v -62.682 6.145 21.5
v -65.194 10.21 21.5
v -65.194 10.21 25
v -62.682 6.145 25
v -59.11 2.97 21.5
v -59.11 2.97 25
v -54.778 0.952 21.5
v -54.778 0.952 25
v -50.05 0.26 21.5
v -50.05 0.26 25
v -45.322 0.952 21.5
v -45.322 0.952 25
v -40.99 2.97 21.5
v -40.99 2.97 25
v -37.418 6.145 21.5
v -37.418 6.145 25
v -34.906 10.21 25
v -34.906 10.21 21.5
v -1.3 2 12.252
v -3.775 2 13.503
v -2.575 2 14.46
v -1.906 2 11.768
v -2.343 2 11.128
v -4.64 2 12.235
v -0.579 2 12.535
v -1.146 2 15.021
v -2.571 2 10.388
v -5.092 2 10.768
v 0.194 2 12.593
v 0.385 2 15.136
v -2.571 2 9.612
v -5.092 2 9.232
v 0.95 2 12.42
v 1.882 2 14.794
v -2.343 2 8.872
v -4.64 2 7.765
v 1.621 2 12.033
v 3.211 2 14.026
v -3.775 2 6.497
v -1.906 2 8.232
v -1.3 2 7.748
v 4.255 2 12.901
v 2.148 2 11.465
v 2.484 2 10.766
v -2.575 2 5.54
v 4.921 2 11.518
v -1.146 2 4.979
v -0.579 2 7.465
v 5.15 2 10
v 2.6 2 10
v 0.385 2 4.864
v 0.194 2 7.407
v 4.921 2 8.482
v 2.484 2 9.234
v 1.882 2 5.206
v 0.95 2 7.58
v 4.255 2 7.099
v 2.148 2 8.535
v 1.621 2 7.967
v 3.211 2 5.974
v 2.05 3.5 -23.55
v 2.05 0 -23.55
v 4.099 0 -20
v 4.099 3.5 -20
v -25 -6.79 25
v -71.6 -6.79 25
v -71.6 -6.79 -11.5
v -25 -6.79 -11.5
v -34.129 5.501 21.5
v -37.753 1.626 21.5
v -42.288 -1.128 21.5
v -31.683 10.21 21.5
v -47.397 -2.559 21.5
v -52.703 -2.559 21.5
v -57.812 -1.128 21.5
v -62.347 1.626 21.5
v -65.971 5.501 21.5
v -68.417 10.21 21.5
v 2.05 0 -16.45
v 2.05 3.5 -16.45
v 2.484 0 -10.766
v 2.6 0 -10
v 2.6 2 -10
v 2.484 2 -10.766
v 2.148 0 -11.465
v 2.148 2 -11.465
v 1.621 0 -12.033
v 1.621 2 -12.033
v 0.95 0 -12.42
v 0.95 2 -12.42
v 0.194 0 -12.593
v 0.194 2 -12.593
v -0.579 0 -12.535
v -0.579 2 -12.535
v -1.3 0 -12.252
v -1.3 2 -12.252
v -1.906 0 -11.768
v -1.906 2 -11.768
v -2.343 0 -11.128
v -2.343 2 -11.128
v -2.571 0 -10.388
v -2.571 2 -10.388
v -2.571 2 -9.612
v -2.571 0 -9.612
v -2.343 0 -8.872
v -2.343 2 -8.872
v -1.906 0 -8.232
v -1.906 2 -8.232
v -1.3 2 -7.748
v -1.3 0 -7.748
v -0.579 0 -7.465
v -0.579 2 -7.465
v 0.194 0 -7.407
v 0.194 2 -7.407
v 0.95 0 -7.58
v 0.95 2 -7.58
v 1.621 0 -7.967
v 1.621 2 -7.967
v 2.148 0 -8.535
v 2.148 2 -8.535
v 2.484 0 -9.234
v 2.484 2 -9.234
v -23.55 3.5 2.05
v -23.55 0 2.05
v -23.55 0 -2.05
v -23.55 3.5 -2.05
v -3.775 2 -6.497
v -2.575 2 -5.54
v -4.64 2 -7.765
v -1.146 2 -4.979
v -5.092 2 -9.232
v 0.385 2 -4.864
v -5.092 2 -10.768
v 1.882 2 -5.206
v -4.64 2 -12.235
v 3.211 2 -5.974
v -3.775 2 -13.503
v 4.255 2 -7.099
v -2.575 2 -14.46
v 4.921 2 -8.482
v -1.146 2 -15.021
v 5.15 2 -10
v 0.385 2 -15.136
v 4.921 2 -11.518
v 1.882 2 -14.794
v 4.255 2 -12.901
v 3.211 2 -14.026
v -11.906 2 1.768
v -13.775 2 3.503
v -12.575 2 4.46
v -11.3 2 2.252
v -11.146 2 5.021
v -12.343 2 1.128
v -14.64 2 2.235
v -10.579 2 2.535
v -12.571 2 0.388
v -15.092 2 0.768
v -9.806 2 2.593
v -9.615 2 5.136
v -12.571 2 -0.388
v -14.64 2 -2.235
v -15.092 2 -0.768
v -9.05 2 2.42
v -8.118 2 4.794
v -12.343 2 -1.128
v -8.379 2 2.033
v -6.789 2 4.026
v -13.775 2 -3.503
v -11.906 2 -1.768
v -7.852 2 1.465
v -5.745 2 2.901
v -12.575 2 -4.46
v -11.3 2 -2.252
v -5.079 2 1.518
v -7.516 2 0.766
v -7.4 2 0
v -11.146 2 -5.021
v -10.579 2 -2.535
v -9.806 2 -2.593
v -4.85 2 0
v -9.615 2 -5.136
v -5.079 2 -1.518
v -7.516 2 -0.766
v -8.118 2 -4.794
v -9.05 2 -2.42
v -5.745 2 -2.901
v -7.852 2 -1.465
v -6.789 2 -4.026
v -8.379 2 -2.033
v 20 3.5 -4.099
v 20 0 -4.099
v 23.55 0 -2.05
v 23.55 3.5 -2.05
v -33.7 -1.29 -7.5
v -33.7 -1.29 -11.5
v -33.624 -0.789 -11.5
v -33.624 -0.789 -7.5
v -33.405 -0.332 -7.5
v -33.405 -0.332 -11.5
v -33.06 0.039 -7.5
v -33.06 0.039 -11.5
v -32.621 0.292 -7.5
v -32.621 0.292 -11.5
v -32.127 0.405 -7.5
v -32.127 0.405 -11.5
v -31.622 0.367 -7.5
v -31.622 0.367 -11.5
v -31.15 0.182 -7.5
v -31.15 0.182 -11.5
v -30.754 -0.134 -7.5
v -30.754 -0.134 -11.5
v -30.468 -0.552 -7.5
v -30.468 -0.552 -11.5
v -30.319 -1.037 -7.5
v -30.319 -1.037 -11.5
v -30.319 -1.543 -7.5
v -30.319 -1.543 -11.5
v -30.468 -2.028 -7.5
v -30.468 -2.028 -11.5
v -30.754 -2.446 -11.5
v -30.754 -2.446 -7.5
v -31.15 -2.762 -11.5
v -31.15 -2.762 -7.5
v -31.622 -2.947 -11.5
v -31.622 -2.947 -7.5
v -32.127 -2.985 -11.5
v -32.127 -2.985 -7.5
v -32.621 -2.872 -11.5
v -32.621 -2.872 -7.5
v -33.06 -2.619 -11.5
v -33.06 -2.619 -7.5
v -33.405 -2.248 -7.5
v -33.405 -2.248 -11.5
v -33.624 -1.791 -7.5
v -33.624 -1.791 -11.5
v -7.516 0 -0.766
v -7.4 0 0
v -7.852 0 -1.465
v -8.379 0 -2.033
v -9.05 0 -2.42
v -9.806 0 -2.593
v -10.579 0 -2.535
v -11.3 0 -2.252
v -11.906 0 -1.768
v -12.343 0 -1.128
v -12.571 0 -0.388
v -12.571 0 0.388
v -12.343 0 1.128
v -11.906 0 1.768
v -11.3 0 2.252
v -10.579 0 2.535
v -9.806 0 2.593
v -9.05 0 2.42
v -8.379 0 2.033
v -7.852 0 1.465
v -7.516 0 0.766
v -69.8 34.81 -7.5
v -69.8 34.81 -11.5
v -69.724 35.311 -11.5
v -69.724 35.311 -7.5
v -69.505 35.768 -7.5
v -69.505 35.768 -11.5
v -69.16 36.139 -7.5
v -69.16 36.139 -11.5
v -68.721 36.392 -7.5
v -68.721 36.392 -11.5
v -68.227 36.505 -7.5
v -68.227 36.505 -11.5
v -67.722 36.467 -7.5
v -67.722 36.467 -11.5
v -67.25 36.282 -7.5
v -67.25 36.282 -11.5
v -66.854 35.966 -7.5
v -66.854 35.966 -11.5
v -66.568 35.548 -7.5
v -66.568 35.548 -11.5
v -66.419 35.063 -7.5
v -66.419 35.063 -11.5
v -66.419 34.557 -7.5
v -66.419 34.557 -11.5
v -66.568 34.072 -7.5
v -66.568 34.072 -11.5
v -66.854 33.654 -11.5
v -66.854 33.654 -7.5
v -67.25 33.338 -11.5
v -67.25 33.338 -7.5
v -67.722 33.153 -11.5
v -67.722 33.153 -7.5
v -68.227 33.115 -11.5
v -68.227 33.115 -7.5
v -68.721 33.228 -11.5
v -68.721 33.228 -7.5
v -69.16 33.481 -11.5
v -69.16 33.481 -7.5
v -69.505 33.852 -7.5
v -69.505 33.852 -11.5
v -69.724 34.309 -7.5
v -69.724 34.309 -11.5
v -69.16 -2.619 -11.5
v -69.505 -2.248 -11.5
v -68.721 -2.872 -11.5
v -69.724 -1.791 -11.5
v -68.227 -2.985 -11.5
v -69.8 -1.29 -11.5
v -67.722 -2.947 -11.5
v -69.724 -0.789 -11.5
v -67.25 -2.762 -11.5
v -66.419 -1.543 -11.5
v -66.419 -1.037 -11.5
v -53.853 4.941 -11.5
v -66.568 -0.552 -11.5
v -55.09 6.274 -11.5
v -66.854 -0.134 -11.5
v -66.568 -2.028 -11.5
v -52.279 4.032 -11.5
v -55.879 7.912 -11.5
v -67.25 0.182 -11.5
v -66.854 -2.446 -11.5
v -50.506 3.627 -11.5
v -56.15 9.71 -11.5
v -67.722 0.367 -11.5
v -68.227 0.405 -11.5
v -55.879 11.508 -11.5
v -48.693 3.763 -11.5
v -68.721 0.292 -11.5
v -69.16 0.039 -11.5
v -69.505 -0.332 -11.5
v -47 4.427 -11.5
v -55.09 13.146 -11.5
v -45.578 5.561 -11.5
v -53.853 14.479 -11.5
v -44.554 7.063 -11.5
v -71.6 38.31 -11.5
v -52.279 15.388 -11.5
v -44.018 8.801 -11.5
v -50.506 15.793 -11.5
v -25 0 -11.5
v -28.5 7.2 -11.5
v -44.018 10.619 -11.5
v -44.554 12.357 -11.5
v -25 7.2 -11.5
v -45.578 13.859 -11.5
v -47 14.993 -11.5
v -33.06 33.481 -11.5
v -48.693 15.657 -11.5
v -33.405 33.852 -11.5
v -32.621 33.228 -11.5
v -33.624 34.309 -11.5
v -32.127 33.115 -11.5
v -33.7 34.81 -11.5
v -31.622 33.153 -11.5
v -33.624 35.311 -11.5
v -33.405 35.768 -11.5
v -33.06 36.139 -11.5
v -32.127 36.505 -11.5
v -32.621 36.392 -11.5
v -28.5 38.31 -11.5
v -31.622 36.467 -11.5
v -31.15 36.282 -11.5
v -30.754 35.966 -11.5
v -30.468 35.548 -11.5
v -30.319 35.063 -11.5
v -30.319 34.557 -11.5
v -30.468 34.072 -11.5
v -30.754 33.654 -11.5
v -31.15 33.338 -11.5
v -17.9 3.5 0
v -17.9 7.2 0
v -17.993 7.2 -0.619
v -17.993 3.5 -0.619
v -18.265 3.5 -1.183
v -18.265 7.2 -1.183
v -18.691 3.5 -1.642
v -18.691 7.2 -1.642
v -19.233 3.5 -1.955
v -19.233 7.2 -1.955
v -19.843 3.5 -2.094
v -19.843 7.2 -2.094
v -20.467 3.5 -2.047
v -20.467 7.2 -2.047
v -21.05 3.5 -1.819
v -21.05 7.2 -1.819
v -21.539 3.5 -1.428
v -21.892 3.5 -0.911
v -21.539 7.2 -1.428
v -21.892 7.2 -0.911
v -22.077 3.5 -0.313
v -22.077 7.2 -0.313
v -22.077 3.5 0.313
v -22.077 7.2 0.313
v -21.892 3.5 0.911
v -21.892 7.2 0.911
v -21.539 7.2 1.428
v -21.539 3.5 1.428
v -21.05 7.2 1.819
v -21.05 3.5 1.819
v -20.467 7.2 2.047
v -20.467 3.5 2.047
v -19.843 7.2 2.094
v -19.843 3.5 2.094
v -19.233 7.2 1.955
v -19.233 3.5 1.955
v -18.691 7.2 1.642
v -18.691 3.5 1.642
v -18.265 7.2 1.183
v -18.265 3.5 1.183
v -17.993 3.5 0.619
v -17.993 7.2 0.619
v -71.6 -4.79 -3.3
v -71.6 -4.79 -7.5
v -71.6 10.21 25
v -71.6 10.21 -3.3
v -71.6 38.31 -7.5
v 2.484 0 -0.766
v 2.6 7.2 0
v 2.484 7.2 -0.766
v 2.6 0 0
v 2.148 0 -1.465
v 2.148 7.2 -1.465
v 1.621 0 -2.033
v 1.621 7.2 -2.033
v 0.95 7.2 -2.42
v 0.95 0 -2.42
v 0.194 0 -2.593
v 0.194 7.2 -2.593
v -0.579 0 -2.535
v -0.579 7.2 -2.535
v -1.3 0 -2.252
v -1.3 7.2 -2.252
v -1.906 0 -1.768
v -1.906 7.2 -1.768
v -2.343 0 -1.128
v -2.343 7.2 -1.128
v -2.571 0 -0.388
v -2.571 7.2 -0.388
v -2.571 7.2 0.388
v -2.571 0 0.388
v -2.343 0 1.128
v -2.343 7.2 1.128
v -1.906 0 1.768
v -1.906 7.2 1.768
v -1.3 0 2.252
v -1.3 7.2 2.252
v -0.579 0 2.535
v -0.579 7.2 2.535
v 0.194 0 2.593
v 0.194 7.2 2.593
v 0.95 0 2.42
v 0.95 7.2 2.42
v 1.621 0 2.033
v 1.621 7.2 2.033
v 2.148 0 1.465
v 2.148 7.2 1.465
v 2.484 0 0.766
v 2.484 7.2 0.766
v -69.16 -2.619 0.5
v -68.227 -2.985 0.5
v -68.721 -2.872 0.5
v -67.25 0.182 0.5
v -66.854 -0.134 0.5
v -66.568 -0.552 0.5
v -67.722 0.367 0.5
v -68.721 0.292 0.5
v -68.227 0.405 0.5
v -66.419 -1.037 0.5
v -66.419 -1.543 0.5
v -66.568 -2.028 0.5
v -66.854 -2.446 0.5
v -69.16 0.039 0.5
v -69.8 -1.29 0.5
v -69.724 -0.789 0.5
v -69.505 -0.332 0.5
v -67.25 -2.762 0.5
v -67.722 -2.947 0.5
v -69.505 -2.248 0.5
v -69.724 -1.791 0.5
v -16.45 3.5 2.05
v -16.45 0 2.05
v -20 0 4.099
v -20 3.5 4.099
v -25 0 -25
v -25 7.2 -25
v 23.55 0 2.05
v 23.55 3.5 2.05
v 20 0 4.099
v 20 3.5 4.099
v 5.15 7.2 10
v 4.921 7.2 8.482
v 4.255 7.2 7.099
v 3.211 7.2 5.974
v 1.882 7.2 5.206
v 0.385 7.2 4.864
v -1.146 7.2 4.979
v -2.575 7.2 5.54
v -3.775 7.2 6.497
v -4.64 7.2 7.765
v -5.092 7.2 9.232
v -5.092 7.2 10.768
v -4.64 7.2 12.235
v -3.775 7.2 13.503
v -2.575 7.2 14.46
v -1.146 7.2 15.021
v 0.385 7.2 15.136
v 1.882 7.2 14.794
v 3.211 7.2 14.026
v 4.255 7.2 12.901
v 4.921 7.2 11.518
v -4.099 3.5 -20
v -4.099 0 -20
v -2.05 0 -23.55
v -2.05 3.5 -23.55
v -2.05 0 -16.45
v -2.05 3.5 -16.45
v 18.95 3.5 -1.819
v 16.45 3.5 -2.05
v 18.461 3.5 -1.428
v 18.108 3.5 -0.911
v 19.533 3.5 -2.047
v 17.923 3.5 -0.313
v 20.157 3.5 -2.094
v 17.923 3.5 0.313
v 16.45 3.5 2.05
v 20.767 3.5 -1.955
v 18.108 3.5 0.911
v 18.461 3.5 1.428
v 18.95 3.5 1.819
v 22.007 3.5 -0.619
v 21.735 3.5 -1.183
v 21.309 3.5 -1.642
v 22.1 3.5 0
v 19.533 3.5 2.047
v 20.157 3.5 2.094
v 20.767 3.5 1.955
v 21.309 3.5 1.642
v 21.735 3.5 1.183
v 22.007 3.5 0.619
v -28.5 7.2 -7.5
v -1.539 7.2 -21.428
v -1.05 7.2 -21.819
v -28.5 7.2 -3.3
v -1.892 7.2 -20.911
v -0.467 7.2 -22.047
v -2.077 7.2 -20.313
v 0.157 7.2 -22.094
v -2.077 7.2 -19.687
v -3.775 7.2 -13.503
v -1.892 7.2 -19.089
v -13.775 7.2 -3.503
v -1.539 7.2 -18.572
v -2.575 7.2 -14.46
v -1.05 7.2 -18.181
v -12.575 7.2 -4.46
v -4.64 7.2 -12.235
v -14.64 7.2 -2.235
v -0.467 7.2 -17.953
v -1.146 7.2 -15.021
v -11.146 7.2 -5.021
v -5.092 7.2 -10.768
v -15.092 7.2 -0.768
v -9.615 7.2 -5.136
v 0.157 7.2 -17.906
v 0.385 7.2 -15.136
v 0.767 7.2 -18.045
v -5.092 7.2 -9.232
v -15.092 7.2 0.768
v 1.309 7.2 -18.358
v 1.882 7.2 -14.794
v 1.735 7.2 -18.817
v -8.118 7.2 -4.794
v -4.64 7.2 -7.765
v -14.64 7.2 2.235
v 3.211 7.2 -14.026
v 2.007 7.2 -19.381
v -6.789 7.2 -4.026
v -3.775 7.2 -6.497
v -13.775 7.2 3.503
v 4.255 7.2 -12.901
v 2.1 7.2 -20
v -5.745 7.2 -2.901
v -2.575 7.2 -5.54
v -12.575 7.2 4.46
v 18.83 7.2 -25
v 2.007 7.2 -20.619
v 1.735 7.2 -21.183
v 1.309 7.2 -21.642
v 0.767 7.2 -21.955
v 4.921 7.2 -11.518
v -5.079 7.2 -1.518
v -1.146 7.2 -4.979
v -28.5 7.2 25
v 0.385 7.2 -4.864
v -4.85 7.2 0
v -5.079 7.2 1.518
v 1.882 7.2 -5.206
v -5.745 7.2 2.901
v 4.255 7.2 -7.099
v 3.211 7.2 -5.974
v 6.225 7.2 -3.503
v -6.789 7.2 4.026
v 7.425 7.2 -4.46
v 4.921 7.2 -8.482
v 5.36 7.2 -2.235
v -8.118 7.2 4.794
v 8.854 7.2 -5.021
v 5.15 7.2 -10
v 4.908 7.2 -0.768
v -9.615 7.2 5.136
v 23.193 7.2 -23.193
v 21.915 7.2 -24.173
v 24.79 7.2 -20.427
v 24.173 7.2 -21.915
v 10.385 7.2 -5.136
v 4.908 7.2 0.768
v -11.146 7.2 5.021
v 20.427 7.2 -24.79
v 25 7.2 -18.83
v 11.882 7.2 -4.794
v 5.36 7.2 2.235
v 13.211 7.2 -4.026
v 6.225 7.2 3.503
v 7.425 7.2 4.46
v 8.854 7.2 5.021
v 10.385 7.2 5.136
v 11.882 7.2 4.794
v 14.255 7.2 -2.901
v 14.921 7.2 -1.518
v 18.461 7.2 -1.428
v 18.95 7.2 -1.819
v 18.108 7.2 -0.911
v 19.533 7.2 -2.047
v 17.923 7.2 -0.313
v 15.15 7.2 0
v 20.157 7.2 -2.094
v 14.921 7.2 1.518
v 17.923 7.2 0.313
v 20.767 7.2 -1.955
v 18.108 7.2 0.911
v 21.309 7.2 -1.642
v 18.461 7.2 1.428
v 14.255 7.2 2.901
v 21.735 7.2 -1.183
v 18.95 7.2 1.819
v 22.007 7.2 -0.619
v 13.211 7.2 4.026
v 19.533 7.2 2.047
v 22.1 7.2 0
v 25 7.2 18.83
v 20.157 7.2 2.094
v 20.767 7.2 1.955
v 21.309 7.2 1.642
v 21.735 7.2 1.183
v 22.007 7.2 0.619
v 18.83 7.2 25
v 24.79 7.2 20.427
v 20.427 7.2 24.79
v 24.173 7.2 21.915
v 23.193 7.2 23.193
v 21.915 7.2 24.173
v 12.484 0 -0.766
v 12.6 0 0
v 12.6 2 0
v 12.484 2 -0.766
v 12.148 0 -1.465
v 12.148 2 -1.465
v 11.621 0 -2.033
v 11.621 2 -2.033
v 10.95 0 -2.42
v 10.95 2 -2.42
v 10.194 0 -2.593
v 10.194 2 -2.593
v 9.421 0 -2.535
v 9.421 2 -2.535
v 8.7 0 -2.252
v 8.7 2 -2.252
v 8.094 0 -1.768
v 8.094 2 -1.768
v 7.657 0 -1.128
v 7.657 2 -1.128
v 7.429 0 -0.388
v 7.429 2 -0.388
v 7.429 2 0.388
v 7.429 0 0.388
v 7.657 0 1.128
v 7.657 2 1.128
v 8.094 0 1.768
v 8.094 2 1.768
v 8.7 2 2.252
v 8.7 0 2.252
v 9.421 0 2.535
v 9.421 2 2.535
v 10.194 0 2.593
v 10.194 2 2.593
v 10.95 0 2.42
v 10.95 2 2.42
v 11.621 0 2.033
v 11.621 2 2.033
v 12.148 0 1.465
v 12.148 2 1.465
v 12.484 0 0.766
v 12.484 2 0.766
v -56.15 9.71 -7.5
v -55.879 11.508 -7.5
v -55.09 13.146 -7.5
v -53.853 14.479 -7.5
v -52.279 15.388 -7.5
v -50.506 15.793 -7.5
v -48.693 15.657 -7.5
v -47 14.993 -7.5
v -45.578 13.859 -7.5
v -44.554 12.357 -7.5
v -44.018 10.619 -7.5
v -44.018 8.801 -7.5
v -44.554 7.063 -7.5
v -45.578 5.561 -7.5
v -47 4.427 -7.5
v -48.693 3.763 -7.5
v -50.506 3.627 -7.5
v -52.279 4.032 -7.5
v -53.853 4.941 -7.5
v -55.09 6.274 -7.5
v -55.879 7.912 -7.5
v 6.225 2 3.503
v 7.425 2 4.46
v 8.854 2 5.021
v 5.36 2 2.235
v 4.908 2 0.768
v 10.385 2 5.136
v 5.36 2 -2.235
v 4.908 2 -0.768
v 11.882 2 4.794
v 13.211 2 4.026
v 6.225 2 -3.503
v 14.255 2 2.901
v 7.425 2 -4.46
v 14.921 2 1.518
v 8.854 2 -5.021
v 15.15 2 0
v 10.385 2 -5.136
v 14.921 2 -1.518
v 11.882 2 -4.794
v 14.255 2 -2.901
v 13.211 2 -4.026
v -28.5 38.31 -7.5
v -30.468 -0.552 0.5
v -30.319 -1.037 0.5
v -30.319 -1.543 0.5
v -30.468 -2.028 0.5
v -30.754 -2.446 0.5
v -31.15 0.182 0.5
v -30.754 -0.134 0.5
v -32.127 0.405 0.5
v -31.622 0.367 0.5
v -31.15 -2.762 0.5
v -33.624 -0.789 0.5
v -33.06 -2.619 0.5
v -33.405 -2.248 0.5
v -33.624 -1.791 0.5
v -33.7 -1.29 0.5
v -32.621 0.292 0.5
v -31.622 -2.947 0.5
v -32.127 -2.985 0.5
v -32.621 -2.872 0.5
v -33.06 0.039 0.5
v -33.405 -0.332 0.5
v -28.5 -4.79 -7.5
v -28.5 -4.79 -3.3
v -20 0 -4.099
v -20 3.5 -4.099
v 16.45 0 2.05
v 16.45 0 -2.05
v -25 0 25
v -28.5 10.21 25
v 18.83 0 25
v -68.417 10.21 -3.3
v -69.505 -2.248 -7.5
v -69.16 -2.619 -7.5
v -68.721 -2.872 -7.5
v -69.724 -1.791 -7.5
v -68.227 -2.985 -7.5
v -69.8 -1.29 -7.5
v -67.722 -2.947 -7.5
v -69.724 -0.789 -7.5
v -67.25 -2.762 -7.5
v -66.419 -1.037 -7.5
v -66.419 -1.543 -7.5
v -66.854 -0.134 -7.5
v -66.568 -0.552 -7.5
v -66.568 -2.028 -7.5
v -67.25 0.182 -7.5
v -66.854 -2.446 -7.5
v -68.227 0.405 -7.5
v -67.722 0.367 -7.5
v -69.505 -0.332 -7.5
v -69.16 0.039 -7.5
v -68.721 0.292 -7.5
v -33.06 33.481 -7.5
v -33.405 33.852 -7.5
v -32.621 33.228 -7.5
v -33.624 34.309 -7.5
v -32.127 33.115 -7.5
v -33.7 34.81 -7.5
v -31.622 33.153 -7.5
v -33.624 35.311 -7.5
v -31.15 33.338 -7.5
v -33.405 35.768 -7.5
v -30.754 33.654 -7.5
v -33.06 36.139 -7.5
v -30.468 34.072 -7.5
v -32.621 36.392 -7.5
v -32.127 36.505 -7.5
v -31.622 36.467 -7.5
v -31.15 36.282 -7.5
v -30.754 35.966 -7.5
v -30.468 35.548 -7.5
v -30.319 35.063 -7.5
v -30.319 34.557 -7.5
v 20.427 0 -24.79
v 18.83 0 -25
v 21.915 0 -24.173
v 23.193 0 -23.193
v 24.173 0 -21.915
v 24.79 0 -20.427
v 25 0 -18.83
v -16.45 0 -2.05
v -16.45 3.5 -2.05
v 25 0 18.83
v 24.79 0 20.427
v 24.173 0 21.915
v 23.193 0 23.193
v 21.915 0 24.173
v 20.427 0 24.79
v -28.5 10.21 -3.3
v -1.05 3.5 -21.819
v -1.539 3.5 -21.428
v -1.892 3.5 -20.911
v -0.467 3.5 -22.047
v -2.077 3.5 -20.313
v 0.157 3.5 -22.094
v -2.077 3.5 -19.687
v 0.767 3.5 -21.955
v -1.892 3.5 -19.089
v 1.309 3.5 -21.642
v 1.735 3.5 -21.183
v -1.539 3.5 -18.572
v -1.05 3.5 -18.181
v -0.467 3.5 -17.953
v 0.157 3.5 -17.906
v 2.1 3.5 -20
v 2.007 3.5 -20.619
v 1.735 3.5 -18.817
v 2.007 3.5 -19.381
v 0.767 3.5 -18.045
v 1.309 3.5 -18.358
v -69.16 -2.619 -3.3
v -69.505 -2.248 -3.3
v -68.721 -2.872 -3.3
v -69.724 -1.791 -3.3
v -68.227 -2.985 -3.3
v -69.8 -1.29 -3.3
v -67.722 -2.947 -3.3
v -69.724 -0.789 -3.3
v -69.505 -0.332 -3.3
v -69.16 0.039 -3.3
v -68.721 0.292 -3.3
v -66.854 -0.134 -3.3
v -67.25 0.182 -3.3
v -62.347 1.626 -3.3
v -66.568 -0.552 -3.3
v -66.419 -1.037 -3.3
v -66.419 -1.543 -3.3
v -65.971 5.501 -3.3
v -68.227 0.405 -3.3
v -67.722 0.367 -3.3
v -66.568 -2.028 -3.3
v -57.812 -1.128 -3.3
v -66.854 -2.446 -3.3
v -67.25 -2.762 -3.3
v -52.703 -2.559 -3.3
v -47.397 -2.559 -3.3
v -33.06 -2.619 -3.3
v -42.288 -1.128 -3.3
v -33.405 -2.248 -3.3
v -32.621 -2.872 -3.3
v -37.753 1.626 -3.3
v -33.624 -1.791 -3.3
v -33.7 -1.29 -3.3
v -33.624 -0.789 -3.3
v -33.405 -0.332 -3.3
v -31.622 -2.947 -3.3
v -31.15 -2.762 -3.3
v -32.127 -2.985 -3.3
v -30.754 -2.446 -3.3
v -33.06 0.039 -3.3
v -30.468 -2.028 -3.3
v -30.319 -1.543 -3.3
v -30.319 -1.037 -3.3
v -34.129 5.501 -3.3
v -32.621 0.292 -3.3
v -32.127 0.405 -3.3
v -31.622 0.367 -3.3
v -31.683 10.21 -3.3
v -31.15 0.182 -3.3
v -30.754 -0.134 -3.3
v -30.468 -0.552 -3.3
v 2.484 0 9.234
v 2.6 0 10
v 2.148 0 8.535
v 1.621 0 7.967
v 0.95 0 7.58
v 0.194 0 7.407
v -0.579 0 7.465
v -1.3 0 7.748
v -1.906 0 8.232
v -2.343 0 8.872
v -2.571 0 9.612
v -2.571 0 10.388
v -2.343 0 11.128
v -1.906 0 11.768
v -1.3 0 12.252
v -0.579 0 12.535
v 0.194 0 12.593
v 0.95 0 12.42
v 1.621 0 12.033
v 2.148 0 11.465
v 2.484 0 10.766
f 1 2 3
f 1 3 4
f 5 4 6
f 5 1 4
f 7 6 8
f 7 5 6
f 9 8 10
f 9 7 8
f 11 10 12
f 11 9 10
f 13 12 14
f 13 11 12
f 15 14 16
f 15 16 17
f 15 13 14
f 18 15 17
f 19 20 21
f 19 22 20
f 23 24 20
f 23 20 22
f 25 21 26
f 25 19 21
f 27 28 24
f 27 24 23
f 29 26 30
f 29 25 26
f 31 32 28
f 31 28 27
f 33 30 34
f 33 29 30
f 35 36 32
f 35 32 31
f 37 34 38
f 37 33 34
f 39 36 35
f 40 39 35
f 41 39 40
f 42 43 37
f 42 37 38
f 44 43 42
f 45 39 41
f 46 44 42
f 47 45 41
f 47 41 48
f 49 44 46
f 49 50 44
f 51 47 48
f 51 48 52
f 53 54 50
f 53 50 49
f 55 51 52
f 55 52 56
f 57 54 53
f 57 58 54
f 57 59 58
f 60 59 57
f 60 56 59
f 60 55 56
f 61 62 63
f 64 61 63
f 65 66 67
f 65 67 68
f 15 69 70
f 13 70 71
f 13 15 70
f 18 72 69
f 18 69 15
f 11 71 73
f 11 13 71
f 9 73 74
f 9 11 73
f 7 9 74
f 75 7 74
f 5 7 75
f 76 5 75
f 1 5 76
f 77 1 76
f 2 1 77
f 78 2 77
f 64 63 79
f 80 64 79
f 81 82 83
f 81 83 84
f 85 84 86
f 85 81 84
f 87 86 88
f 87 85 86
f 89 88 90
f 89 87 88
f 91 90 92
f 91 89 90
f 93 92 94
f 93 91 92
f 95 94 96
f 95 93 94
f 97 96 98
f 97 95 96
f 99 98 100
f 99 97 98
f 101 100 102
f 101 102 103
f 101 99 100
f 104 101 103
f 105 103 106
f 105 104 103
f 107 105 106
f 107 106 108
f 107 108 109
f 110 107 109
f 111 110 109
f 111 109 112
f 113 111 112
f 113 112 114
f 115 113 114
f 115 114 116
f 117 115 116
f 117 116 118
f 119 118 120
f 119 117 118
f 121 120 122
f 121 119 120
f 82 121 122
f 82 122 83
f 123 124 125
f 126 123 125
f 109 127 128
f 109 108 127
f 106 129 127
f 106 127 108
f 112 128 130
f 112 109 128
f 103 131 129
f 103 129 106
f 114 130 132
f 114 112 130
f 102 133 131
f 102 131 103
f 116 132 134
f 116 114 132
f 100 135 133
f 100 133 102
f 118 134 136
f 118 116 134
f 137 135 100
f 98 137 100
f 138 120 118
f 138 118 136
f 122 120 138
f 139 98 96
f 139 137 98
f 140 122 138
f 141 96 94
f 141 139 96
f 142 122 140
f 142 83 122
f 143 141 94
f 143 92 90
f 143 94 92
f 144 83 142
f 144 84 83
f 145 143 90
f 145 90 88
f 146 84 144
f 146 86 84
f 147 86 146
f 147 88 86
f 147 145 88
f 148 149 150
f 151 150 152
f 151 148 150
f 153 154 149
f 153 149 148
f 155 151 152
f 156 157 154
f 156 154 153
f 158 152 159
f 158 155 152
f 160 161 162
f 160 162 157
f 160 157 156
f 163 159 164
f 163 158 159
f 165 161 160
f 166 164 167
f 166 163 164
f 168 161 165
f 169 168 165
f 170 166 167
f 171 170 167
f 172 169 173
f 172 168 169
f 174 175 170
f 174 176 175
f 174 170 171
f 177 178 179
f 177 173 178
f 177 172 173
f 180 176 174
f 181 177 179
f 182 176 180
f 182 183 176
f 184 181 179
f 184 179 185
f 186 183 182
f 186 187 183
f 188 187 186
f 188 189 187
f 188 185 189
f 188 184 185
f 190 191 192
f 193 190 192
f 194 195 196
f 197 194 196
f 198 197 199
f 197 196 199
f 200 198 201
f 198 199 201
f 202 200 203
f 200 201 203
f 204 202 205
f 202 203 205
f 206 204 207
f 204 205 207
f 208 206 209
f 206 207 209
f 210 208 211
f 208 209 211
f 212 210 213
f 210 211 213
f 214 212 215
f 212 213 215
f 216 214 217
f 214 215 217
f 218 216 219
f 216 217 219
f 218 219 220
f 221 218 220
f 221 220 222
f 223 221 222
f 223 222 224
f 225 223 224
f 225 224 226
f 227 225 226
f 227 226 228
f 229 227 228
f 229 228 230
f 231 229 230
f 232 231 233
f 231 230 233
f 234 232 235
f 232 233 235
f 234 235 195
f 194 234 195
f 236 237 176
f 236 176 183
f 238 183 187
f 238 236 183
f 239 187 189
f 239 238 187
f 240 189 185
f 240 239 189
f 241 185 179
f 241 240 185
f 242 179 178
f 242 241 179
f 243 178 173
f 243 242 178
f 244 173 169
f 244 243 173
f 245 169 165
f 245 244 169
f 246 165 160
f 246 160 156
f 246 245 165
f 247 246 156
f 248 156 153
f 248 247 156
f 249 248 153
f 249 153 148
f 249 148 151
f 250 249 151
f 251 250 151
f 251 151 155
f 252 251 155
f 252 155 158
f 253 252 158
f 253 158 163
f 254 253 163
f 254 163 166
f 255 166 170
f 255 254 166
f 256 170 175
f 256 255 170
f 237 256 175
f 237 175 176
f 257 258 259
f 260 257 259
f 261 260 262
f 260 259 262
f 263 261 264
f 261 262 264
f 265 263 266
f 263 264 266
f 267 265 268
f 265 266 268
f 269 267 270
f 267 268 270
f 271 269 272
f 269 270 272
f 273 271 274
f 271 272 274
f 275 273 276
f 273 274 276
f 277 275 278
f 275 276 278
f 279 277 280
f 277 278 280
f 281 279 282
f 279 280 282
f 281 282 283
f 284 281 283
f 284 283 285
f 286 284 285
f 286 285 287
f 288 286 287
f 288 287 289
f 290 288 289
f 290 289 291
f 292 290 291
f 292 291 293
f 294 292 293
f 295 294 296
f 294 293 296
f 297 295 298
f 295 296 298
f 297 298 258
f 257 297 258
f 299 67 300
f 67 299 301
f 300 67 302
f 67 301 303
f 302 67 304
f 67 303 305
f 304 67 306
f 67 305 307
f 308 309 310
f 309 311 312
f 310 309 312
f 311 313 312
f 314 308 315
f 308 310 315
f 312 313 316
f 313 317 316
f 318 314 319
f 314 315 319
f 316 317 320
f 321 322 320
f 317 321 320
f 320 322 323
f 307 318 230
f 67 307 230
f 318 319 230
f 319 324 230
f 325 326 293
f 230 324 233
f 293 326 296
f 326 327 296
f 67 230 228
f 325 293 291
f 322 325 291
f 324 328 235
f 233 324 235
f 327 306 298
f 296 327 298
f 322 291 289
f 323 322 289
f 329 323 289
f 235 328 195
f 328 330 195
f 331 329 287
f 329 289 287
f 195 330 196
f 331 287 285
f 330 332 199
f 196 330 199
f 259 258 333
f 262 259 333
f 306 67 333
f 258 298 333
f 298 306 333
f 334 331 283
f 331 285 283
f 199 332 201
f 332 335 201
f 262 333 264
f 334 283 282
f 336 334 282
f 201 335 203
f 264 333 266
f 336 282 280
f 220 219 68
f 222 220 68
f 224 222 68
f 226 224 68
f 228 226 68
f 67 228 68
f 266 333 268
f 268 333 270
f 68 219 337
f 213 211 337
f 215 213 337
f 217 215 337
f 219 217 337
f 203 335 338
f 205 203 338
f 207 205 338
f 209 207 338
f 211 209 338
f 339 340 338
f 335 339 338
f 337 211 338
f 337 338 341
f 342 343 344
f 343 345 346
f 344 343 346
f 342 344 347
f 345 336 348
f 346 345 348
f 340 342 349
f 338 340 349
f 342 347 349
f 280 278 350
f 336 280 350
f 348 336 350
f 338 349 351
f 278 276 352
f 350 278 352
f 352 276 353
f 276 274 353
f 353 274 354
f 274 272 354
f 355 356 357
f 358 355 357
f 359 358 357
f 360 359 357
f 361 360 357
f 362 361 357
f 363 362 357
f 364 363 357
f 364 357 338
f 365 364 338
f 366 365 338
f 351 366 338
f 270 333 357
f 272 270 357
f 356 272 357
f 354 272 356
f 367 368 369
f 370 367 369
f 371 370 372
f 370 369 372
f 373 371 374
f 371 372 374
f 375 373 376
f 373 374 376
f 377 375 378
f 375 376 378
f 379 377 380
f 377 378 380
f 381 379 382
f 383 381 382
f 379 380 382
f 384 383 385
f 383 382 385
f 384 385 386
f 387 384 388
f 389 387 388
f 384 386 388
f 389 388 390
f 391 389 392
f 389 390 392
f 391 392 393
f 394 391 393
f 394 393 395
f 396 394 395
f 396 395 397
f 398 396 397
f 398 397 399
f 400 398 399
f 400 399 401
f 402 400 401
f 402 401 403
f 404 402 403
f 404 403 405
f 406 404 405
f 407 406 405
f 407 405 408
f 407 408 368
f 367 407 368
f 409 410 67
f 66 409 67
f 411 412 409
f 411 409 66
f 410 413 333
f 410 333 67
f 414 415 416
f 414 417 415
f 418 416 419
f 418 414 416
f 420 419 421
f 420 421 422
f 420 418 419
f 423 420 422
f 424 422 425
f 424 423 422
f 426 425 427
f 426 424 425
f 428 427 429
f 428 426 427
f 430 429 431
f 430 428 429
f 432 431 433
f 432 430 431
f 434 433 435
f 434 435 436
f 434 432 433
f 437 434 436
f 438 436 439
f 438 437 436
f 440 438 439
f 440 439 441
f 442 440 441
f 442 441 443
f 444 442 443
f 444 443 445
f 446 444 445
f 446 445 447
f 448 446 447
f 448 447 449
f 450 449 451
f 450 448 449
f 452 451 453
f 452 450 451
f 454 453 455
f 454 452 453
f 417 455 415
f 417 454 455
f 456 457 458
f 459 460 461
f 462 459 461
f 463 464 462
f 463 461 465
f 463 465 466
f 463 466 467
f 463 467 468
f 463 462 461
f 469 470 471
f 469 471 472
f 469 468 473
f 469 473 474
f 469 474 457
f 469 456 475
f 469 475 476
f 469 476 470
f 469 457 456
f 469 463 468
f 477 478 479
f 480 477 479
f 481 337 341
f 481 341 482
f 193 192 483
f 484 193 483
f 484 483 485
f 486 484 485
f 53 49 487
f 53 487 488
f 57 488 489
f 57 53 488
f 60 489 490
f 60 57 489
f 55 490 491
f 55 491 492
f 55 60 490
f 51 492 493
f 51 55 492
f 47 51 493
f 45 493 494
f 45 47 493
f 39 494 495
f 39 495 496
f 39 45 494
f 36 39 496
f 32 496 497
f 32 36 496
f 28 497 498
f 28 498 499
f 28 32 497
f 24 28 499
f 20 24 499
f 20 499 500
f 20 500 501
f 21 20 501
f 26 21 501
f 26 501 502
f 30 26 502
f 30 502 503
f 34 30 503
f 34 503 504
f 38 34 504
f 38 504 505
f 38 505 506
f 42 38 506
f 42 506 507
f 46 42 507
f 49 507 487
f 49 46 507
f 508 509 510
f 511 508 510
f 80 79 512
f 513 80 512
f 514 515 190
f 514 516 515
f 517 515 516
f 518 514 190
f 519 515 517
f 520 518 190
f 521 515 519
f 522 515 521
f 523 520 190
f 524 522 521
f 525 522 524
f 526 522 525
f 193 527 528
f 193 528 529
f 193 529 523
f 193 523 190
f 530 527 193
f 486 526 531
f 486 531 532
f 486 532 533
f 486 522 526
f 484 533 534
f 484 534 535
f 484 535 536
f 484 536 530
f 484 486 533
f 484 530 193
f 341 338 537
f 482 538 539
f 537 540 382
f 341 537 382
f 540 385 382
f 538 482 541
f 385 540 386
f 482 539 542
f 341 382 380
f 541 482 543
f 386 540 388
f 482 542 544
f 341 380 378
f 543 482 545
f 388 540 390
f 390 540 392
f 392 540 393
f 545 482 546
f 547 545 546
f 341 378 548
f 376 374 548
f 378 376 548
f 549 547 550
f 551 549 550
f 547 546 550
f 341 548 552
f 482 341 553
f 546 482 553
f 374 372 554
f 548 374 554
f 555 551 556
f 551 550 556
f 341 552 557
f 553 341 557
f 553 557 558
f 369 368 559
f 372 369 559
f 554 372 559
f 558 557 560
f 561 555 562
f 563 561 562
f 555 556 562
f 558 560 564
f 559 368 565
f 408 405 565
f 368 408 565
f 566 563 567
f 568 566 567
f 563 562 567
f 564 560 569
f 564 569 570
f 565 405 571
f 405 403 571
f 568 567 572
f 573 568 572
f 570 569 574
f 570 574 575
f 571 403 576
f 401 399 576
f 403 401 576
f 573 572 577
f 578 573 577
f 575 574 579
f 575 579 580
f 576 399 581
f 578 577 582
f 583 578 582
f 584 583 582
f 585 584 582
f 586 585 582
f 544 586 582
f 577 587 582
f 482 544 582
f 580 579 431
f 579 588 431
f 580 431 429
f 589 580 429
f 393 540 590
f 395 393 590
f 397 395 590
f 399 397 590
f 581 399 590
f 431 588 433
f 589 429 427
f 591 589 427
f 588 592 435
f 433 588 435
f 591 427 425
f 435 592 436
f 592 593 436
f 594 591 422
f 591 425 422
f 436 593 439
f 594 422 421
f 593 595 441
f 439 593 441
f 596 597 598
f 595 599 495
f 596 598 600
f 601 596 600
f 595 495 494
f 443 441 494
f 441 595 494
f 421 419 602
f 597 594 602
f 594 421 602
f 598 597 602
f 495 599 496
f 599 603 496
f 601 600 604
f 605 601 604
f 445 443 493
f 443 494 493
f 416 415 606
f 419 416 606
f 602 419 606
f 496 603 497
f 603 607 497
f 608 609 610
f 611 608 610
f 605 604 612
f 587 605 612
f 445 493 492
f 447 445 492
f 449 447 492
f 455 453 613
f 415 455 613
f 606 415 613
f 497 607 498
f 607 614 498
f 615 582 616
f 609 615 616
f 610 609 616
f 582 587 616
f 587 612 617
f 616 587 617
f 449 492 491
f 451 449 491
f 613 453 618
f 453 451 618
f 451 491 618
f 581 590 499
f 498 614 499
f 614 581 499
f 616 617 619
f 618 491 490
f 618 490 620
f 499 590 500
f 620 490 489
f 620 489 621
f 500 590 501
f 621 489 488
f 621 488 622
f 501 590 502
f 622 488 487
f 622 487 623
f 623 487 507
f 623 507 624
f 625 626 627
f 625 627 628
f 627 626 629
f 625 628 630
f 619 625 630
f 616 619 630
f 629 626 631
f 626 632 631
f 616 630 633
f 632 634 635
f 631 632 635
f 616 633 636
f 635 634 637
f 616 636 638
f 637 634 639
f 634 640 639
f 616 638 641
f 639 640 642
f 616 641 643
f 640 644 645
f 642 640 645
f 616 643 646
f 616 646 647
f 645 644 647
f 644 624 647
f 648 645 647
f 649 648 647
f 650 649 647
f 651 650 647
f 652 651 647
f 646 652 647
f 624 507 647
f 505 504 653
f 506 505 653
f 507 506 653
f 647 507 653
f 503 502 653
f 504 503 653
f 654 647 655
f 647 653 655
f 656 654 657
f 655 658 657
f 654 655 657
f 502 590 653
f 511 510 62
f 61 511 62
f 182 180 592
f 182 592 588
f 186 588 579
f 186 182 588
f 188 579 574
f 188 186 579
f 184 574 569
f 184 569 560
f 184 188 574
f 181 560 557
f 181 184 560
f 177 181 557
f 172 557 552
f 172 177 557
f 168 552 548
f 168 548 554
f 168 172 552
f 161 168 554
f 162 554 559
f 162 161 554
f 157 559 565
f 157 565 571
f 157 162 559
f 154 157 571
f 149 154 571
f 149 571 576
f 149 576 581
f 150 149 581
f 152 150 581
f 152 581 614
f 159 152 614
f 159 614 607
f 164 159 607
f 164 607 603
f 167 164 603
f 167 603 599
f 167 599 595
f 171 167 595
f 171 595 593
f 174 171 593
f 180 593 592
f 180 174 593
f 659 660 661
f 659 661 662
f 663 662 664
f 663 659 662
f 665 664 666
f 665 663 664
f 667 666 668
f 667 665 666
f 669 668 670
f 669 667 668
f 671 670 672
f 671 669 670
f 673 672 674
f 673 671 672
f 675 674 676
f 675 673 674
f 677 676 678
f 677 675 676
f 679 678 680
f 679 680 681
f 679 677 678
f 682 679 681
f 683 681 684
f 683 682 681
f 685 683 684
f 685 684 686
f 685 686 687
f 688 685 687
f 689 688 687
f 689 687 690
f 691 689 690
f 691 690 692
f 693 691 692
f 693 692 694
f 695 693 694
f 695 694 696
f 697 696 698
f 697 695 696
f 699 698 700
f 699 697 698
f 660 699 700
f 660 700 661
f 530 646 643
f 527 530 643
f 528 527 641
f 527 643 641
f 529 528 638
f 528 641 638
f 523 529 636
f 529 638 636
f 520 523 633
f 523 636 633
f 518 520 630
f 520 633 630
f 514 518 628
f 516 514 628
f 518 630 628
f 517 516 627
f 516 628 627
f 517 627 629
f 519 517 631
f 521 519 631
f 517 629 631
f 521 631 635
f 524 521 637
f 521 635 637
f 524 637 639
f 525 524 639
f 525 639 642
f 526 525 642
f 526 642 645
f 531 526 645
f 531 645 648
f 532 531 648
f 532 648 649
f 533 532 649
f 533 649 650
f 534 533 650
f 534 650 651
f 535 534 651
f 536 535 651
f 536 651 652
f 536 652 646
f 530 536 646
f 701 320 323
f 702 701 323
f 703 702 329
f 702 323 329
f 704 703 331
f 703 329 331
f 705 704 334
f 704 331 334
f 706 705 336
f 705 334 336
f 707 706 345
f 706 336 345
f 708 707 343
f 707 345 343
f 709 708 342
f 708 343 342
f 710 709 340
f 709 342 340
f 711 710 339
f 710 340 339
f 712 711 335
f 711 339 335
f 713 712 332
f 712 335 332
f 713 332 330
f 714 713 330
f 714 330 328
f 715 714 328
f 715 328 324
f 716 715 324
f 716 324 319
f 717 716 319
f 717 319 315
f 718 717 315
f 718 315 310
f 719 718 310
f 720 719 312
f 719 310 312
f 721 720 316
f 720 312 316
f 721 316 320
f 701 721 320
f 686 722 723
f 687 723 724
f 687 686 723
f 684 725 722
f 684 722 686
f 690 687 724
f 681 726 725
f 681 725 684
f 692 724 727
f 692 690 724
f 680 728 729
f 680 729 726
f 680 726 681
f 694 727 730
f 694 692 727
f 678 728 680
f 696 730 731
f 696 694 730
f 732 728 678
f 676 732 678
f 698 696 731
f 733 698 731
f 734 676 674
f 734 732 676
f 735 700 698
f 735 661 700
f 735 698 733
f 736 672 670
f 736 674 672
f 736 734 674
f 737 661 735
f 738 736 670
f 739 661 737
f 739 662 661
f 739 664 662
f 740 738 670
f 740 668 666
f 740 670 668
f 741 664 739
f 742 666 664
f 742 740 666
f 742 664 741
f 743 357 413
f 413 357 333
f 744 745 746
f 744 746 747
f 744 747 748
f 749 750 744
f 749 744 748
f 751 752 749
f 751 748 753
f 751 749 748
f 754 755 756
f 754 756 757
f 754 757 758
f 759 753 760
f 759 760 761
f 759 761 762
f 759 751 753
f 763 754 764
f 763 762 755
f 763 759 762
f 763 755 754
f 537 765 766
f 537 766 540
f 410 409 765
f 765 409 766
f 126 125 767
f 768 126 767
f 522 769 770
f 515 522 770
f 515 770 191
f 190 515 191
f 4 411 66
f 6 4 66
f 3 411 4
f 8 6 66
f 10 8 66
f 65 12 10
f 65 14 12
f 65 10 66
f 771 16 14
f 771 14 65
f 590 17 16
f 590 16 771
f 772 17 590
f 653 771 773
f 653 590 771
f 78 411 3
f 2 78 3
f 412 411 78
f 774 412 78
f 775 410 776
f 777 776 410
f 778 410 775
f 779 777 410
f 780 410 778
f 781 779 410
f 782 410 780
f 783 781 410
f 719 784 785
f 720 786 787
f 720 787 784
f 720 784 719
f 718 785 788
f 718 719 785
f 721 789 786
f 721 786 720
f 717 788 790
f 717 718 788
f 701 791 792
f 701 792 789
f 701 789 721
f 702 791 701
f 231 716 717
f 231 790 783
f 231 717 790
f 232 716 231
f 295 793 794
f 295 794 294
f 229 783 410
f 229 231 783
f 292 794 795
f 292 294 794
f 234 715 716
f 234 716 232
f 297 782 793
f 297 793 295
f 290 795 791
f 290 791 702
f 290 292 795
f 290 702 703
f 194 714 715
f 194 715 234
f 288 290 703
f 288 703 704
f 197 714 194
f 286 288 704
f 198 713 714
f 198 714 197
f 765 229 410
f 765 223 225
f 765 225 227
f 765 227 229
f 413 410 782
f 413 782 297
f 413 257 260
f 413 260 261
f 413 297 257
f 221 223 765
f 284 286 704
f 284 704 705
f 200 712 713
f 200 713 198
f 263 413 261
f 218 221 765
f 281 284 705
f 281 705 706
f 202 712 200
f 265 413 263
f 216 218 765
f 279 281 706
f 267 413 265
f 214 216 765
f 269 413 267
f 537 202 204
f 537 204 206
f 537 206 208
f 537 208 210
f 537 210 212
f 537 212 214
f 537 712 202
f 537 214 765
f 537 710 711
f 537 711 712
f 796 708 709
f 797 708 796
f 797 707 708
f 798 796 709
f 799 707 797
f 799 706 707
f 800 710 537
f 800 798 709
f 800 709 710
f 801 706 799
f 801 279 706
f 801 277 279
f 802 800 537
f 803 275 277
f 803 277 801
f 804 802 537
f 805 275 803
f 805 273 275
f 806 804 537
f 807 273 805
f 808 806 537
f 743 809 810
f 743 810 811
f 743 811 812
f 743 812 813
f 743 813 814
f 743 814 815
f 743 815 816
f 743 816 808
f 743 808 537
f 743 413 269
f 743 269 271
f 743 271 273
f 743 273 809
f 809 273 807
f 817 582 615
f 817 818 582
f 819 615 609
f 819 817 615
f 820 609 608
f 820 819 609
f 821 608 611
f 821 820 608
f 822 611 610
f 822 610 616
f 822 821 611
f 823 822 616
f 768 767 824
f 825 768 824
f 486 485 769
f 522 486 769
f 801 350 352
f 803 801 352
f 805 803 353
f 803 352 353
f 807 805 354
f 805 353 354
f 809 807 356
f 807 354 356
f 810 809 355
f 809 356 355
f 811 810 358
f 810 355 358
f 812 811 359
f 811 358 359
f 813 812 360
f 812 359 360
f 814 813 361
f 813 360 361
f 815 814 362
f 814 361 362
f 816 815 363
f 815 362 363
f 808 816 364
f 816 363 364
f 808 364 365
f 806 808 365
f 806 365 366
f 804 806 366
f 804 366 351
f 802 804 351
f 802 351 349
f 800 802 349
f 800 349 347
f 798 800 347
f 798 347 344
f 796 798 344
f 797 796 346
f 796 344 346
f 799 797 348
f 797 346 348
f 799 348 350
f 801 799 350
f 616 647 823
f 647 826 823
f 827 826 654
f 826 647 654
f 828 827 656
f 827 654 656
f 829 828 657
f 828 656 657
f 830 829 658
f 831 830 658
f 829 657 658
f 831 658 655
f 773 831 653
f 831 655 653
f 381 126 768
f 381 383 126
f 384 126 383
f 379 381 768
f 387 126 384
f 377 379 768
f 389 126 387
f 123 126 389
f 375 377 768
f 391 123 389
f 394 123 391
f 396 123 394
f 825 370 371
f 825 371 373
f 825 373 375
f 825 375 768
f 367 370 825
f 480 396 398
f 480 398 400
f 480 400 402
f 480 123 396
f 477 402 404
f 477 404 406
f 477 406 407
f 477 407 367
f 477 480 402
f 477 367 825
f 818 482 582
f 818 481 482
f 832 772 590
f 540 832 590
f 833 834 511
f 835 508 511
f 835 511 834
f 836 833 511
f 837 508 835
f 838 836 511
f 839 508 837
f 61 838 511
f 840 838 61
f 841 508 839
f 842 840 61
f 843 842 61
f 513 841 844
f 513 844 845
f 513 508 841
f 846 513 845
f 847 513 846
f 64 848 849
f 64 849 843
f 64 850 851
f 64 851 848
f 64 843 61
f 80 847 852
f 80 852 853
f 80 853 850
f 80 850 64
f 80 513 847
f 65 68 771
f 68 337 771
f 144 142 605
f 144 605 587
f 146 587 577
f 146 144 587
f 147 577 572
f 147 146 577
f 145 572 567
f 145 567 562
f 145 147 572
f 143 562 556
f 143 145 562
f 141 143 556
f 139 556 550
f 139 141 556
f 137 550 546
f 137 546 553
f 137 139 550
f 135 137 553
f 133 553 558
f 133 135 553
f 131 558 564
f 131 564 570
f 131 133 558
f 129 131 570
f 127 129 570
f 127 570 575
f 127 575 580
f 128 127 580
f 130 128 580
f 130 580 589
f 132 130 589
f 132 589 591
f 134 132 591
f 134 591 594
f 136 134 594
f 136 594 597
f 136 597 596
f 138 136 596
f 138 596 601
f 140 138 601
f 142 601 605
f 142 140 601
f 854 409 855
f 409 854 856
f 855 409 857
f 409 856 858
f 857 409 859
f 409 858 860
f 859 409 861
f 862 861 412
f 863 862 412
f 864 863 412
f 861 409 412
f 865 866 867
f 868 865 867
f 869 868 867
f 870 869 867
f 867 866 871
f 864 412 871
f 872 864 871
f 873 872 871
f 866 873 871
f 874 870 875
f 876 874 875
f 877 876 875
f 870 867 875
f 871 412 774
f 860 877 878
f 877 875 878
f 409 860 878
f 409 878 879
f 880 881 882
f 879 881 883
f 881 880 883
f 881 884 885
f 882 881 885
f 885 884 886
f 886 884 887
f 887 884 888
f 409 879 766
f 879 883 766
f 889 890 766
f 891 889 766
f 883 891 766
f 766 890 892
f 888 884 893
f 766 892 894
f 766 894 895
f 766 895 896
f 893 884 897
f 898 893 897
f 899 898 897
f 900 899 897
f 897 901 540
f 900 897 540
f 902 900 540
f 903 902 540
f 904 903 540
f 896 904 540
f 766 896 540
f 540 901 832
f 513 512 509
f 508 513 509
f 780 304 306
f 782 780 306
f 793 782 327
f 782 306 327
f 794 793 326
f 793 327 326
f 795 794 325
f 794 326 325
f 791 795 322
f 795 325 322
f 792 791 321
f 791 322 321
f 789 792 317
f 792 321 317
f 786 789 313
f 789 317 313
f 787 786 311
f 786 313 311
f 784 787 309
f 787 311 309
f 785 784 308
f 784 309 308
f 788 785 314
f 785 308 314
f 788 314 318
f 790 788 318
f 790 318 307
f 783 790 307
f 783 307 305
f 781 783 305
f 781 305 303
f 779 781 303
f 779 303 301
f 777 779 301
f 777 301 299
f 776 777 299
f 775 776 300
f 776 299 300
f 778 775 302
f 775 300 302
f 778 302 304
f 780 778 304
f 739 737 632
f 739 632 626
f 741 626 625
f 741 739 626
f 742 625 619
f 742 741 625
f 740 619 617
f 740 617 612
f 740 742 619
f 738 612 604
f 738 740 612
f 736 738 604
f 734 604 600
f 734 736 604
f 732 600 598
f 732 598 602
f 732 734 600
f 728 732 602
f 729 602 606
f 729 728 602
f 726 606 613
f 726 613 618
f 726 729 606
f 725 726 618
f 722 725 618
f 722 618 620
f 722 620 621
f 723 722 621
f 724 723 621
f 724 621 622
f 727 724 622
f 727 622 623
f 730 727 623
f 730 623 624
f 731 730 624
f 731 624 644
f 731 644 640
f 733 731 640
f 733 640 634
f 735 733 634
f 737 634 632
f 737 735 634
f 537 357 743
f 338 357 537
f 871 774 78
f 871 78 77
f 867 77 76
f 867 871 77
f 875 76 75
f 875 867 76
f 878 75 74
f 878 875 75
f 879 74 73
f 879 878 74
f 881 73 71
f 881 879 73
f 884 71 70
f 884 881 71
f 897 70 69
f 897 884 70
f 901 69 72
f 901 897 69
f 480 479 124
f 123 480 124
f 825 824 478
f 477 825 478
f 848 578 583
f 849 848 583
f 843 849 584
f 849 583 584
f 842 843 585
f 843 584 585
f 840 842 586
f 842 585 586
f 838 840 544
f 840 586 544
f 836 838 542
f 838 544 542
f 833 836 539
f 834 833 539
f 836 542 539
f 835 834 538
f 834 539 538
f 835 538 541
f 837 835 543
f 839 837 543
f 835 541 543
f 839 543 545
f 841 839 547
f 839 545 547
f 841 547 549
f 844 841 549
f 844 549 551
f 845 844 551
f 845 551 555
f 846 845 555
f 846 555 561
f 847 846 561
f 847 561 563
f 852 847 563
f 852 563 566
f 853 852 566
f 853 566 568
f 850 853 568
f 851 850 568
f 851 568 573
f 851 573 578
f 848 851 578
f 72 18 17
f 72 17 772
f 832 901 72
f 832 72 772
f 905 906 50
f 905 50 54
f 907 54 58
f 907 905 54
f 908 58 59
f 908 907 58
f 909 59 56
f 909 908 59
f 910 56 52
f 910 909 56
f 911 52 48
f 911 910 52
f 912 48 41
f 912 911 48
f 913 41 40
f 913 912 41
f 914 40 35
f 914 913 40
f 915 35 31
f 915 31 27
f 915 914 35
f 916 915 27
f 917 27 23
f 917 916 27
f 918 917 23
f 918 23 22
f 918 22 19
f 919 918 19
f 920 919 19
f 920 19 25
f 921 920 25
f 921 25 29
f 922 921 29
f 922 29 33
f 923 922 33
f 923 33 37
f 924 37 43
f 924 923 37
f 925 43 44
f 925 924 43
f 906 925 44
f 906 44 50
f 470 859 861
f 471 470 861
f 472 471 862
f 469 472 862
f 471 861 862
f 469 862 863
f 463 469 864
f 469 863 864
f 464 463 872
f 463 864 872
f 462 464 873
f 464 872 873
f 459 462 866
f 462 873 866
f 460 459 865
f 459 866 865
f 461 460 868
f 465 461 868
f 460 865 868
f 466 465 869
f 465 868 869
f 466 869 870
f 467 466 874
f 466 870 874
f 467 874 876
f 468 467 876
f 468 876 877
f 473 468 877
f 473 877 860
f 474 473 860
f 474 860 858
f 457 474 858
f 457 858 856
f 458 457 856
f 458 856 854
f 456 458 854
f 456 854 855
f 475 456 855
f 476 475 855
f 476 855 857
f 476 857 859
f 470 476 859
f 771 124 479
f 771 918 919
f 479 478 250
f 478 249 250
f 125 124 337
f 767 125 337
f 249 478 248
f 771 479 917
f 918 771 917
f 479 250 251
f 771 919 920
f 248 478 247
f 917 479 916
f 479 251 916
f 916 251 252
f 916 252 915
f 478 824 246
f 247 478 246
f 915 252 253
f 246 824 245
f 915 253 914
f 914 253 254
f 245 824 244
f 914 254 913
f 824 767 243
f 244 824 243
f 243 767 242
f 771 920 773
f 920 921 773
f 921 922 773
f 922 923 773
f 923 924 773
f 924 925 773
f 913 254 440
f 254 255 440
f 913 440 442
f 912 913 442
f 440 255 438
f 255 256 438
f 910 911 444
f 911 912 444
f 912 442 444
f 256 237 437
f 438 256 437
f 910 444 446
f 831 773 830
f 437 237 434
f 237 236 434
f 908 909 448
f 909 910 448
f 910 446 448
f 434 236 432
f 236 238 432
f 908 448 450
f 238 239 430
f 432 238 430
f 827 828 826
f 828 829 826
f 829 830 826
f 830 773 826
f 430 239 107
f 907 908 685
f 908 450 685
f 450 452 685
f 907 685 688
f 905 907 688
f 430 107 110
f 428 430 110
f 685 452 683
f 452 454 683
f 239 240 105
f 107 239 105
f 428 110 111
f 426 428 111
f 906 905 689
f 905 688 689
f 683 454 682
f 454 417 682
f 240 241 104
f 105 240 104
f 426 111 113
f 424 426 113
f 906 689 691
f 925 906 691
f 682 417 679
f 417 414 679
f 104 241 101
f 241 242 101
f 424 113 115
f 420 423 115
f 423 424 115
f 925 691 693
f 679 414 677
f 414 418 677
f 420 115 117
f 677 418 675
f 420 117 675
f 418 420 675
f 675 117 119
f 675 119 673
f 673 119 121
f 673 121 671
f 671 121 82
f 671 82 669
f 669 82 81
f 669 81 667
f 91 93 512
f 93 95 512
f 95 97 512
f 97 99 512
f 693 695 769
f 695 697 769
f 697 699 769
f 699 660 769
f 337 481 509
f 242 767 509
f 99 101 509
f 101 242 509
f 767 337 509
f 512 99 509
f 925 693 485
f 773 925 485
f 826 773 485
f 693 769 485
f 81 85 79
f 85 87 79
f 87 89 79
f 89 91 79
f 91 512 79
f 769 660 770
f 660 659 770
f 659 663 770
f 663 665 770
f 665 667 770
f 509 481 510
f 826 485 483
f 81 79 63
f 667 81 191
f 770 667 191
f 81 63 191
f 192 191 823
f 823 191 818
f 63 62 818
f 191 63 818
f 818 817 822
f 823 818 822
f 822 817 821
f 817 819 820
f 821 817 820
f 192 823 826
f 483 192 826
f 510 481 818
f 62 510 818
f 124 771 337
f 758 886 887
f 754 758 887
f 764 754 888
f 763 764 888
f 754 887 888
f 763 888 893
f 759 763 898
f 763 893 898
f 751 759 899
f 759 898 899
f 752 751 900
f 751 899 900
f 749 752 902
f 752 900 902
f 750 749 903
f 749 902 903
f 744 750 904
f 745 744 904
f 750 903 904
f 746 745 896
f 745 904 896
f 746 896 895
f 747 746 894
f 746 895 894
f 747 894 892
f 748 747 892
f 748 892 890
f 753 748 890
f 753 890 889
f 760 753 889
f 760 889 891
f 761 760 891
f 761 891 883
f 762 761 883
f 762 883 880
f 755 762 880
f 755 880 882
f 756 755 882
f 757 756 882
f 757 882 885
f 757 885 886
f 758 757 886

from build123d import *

# Parameters (mm, degrees)
SKETCH_2_W          = 50
SKETCH_2_H          = 50
SKETCH_2_R          = 2.6
EXTRUDE_1_DEPTH     = 2
SKETCH_3_W          = 50
SKETCH_3_H          = 50
SKETCH_3_R          = 5.15
SKETCH_3_R_2        = 2.6
EXTRUDE_2_DEPTH     = 5.2
SKETCH_4_R          = 2.1
CUT_EXTRUDE_1_DEPTH = 10
CUT_EXTRUDE_2_DEPTH = 3.5
FILLET_1_R          = 6.17
FILLET_2_R          = 6.17
SKETCH_7_W          = 43.1
SKETCH_7_H          = 43.1
SKETCH_7_R          = 6.1
SKETCH_7_R_2        = 1.7
EXTRUDE_3_DEPTH     = 4
EXTRUDE_4_DEPTH     = 29
EXTRUDE_5_DEPTH     = 3.5
SKETCH_10_W         = 3.5
SKETCH_10_H         = 11.99
EXTRUDE_6_DEPTH     = 36.5
SKETCH_11_W         = 43.1
SKETCH_11_H         = 43.1
CUT_EXTRUDE_3_DEPTH = 4.2
SKETCH_12_W         = 46.6
SKETCH_12_H         = 36.5
EXTRUDE_7_DEPTH     = 2
SKETCH_13_R         = 1.7
CUT_EXTRUDE_4_DEPTH = 12


with BuildPart() as part:
    # 스케치2 → 보스-돌출1 (new body)
    with BuildSketch(Plane(origin=(0, 0, 0), x_dir=(1, 0, 0), z_dir=(0, 1, 0))):
        Rectangle(SKETCH_2_W, SKETCH_2_H)
        Circle(SKETCH_2_R, mode=Mode.SUBTRACT)
        with Locations((10, 0)):
            Circle(SKETCH_2_R, mode=Mode.SUBTRACT)
        with Locations((0, -10)):
            Circle(SKETCH_2_R, mode=Mode.SUBTRACT)
        with Locations((-10, 0)):
            Circle(SKETCH_2_R, mode=Mode.SUBTRACT)
        with Locations((0, 10)):
            Circle(SKETCH_2_R, mode=Mode.SUBTRACT)
    extrude(amount=EXTRUDE_1_DEPTH)

    # 스케치3 → 보스-돌출2 (add)
    with BuildSketch(Plane(origin=(0, 2, 0), x_dir=(1, 0, 0), z_dir=(0, 1, 0))):
        Rectangle(SKETCH_3_W, SKETCH_3_H)
        with Locations((0, -10)):
            Circle(SKETCH_3_R, mode=Mode.SUBTRACT)
        with Locations((-10, 0)):
            Circle(SKETCH_3_R, mode=Mode.SUBTRACT)
        Circle(SKETCH_3_R_2, mode=Mode.SUBTRACT)
        with Locations((10, 0)):
            Circle(SKETCH_3_R, mode=Mode.SUBTRACT)
        with Locations((0, 10)):
            Circle(SKETCH_3_R, mode=Mode.SUBTRACT)
    extrude(amount=EXTRUDE_2_DEPTH)

    # 스케치4 → 컷-돌출1 (cut)
    with BuildSketch(Plane(origin=(0, 7.2, 0), x_dir=(1, 0, 0), z_dir=(0, 1, 0))):
        with Locations((20, 0)):
            Circle(SKETCH_4_R)
        with Locations((0, 20)):
            Circle(SKETCH_4_R)
        with Locations((-20, 0)):
            Circle(SKETCH_4_R)
    extrude(amount=-CUT_EXTRUDE_1_DEPTH, mode=Mode.SUBTRACT)

    # 스케치6 → 컷-돌출2 (cut)
    with BuildSketch(Plane.XZ):
        Polygon((-16.45, -2.049593456), (-16.45, 2.049593456), (-20, 4.099186911), (-23.55, 2.049593456), (-23.55, -2.049593456), (-20, -4.099186911), align=None)
        Polygon((2.049593456, -16.45), (-2.049593456, -16.45), (-4.099186911, -20), (-2.049593456, -23.55), (2.049593456, -23.55), (4.099186911, -20), align=None)
        Polygon((16.45, 2.049593456), (16.45, -2.049593456), (20, -4.099186911), (23.55, -2.049593456), (23.55, 2.049593456), (20, 4.099186911), align=None)
    extrude(amount=-CUT_EXTRUDE_2_DEPTH, mode=Mode.SUBTRACT)

    # 필렛1
    fillet_1_edges = [part.edges().sort_by_distance(p)[0] for p in [
        (25, 3.6, -25),
    ]]
    fillet(fillet_1_edges, radius=FILLET_1_R)

    # 필렛2
    fillet_2_edges = [part.edges().sort_by_distance(p)[0] for p in [
        (25, 3.6, 25),
    ]]
    fillet(fillet_2_edges, radius=FILLET_2_R)



with BuildPart() as body_2:
    # 스케치7 → 보스-돌출3 (new body)
    with BuildSketch(Plane(origin=(0, 0, -11.5), x_dir=(-1, 0, 0), z_dir=(0, 0, -1))):
        with Locations((50.05, 16.76)):
            Rectangle(SKETCH_7_W, SKETCH_7_H)
        with Locations((50.05, 9.71)):
            Circle(SKETCH_7_R, mode=Mode.SUBTRACT)
        with Locations((68.1, 34.81)):
            Circle(SKETCH_7_R_2, mode=Mode.SUBTRACT)
        with Locations((68.1, -1.29)):
            Circle(SKETCH_7_R_2, mode=Mode.SUBTRACT)
        with Locations((32, -1.29)):
            Circle(SKETCH_7_R_2, mode=Mode.SUBTRACT)
        with Locations((32, 34.81)):
            Circle(SKETCH_7_R_2, mode=Mode.SUBTRACT)
    extrude(amount=-EXTRUDE_3_DEPTH)

    # 스케치8 → 보스-돌출4 (add)
    with BuildSketch(Plane.XY.offset(-7.5)):
        with BuildLine():
            Line((-71.6, 10.21), (-68.417022078, 10.21))
            ThreePointArc((-68.417022078, 10.21), (-50.05, -2.74), (-31.682977922, 10.21))
            Line((-31.682977922, 10.21), (-28.5, 10.21))
            Line((-28.5, 10.21), (-28.5, -4.79))
            Line((-28.5, -4.79), (-71.6, -4.79))
            Line((-71.6, -4.79), (-71.6, 10.21))
        make_face()
    extrude(amount=EXTRUDE_4_DEPTH)

    # 스케치9 → 보스-돌출5 (add)
    with BuildSketch(Plane.XY.offset(21.5)):
        with BuildLine():
            Line((-34.905776679, 10.21), (-28.5, 10.21))
            Line((-28.5, 10.21), (-28.5, -4.79))
            Line((-28.5, -4.79), (-71.6, -4.79))
            Line((-71.6, -4.79), (-71.6, 10.21))
            Line((-71.6, 10.21), (-65.194223321, 10.21))
            ThreePointArc((-65.194223321, 10.21), (-50.05, 0.26), (-34.905776679, 10.21))
        make_face()
    extrude(amount=EXTRUDE_5_DEPTH)


with BuildPart() as part_1:
    add(part.part)

    add(body_2.part)  # 보스-돌출6 merges body 2
    # 스케치10 → 보스-돌출6 (add)
    with BuildSketch(Plane.XY.offset(25)):
        with Locations((-26.75, 1.205)):
            Rectangle(SKETCH_10_W, SKETCH_10_H)
    extrude(amount=-EXTRUDE_6_DEPTH)

    # 스케치11 → 컷-돌출3 (cut)
    with BuildSketch(Plane.XY.offset(-7.5)):
        with Locations((-50.05, 16.76)):
            Rectangle(SKETCH_11_W, SKETCH_11_H)
    extrude(amount=CUT_EXTRUDE_3_DEPTH, mode=Mode.SUBTRACT)

    # 스케치12 → 보스-돌출7 (add)
    with BuildSketch(Plane.XZ.offset(4.79)):
        with Locations((-48.3, 6.75)):
            Rectangle(SKETCH_12_W, SKETCH_12_H)
    extrude(amount=EXTRUDE_7_DEPTH)

    # 스케치13 → 컷-돌출4 (cut)
    with BuildSketch(Plane(origin=(0, 0, -11.5), x_dir=(-1, 0, 0), z_dir=(0, 0, -1))):
        with Locations((68.1, 34.81)):
            Circle(SKETCH_13_R)
        with Locations((68.1, -1.29)):
            Circle(SKETCH_13_R)
        with Locations((32, -1.29)):
            Circle(SKETCH_13_R)
        with Locations((32, 34.81)):
            Circle(SKETCH_13_R)
    extrude(amount=-CUT_EXTRUDE_4_DEPTH, mode=Mode.SUBTRACT)


solid = part_1.part
